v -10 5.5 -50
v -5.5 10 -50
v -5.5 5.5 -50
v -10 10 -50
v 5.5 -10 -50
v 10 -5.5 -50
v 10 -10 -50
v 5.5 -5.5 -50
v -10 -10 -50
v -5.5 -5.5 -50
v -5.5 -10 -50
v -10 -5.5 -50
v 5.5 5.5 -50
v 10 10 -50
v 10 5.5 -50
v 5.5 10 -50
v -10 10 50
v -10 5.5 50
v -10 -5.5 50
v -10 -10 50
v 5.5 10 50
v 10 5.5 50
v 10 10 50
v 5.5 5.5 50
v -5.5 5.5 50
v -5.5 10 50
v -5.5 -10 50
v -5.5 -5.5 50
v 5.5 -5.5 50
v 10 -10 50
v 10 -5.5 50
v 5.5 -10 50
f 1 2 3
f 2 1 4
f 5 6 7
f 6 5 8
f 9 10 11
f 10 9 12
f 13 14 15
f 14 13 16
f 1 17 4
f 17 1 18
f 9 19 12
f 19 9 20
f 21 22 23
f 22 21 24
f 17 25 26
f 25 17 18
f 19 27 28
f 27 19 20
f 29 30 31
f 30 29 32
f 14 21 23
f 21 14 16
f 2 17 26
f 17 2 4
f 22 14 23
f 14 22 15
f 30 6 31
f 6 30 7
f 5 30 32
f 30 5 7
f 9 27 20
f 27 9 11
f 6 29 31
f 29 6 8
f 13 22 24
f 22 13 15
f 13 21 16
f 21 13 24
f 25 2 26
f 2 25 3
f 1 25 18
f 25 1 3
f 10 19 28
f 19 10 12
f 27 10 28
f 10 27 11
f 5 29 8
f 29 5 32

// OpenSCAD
$fn = 96;

length = 100;
size   = 20;

module extrusion2020(len=100, s=20) {
    // 20x20 T-slot extrusion, length along Z, centered on XY.
    // One connected solid: outer body minus connected slot/cavity network + center bore.
    eps = 0.25;

    // Key dimensions (mm) - approximate common 2020 profile
    slot_open_w   = 6.2;   // opening at the face
    slot_open_d   = 2.2;   // depth of the narrow opening from the face
    slot_neck_w   = 4.4;   // neck width
    slot_neck_d   = 4.8;   // neck depth from face
    slot_cav_w    = 11.0;  // inner cavity width (T area)
    slot_cav_d    = 7.6;   // cavity depth from face

    web_th        = 2.0;   // wall/web thickness
    center_bore_d = 5.2;   // typical 2020 center bore

    // Derived positions (from dimensions)
    face_y        = s/2;
    open_center_y = face_y - slot_open_d/2;
    neck_center_y = face_y - slot_neck_d/2;
    cav_center_y  = face_y - slot_cav_d/2;

    // Core void sized so cavities overlap it (ensures connected internal void network)
    core_half = max( (s/2) - slot_cav_d + web_th, 3.0 );
    core_size = 2*core_half;

    // Build as 2D profile extruded once to avoid axis/view confusion
    difference() {
        // Outer solid
        linear_extrude(height=len, center=true, convexity=10)
            square([s, s], center=true);

        // All voids (extruded together)
        linear_extrude(height=len + 2*eps, center=true, convexity=10) {
            // Center bore
            circle(d=center_bore_d);

            // Core void (connects all four slot cavities)
            square([core_size, core_size], center=true);

            // Four T-slots (2D cutouts)
            for (a = [0:90:270]) rotate(a) {
                // Opening
                translate([0, open_center_y])
                    square([slot_open_w, slot_open_d + eps], center=true);

                // Neck
                translate([0, neck_center_y])
                    square([slot_neck_w, slot_neck_d + eps], center=true);

                // Inner cavity (overlaps core)
                translate([0, cav_center_y])
                    square([slot_cav_w, slot_cav_d + eps], center=true);
            }
        }
    }
}

extrusion2020(length, size);
